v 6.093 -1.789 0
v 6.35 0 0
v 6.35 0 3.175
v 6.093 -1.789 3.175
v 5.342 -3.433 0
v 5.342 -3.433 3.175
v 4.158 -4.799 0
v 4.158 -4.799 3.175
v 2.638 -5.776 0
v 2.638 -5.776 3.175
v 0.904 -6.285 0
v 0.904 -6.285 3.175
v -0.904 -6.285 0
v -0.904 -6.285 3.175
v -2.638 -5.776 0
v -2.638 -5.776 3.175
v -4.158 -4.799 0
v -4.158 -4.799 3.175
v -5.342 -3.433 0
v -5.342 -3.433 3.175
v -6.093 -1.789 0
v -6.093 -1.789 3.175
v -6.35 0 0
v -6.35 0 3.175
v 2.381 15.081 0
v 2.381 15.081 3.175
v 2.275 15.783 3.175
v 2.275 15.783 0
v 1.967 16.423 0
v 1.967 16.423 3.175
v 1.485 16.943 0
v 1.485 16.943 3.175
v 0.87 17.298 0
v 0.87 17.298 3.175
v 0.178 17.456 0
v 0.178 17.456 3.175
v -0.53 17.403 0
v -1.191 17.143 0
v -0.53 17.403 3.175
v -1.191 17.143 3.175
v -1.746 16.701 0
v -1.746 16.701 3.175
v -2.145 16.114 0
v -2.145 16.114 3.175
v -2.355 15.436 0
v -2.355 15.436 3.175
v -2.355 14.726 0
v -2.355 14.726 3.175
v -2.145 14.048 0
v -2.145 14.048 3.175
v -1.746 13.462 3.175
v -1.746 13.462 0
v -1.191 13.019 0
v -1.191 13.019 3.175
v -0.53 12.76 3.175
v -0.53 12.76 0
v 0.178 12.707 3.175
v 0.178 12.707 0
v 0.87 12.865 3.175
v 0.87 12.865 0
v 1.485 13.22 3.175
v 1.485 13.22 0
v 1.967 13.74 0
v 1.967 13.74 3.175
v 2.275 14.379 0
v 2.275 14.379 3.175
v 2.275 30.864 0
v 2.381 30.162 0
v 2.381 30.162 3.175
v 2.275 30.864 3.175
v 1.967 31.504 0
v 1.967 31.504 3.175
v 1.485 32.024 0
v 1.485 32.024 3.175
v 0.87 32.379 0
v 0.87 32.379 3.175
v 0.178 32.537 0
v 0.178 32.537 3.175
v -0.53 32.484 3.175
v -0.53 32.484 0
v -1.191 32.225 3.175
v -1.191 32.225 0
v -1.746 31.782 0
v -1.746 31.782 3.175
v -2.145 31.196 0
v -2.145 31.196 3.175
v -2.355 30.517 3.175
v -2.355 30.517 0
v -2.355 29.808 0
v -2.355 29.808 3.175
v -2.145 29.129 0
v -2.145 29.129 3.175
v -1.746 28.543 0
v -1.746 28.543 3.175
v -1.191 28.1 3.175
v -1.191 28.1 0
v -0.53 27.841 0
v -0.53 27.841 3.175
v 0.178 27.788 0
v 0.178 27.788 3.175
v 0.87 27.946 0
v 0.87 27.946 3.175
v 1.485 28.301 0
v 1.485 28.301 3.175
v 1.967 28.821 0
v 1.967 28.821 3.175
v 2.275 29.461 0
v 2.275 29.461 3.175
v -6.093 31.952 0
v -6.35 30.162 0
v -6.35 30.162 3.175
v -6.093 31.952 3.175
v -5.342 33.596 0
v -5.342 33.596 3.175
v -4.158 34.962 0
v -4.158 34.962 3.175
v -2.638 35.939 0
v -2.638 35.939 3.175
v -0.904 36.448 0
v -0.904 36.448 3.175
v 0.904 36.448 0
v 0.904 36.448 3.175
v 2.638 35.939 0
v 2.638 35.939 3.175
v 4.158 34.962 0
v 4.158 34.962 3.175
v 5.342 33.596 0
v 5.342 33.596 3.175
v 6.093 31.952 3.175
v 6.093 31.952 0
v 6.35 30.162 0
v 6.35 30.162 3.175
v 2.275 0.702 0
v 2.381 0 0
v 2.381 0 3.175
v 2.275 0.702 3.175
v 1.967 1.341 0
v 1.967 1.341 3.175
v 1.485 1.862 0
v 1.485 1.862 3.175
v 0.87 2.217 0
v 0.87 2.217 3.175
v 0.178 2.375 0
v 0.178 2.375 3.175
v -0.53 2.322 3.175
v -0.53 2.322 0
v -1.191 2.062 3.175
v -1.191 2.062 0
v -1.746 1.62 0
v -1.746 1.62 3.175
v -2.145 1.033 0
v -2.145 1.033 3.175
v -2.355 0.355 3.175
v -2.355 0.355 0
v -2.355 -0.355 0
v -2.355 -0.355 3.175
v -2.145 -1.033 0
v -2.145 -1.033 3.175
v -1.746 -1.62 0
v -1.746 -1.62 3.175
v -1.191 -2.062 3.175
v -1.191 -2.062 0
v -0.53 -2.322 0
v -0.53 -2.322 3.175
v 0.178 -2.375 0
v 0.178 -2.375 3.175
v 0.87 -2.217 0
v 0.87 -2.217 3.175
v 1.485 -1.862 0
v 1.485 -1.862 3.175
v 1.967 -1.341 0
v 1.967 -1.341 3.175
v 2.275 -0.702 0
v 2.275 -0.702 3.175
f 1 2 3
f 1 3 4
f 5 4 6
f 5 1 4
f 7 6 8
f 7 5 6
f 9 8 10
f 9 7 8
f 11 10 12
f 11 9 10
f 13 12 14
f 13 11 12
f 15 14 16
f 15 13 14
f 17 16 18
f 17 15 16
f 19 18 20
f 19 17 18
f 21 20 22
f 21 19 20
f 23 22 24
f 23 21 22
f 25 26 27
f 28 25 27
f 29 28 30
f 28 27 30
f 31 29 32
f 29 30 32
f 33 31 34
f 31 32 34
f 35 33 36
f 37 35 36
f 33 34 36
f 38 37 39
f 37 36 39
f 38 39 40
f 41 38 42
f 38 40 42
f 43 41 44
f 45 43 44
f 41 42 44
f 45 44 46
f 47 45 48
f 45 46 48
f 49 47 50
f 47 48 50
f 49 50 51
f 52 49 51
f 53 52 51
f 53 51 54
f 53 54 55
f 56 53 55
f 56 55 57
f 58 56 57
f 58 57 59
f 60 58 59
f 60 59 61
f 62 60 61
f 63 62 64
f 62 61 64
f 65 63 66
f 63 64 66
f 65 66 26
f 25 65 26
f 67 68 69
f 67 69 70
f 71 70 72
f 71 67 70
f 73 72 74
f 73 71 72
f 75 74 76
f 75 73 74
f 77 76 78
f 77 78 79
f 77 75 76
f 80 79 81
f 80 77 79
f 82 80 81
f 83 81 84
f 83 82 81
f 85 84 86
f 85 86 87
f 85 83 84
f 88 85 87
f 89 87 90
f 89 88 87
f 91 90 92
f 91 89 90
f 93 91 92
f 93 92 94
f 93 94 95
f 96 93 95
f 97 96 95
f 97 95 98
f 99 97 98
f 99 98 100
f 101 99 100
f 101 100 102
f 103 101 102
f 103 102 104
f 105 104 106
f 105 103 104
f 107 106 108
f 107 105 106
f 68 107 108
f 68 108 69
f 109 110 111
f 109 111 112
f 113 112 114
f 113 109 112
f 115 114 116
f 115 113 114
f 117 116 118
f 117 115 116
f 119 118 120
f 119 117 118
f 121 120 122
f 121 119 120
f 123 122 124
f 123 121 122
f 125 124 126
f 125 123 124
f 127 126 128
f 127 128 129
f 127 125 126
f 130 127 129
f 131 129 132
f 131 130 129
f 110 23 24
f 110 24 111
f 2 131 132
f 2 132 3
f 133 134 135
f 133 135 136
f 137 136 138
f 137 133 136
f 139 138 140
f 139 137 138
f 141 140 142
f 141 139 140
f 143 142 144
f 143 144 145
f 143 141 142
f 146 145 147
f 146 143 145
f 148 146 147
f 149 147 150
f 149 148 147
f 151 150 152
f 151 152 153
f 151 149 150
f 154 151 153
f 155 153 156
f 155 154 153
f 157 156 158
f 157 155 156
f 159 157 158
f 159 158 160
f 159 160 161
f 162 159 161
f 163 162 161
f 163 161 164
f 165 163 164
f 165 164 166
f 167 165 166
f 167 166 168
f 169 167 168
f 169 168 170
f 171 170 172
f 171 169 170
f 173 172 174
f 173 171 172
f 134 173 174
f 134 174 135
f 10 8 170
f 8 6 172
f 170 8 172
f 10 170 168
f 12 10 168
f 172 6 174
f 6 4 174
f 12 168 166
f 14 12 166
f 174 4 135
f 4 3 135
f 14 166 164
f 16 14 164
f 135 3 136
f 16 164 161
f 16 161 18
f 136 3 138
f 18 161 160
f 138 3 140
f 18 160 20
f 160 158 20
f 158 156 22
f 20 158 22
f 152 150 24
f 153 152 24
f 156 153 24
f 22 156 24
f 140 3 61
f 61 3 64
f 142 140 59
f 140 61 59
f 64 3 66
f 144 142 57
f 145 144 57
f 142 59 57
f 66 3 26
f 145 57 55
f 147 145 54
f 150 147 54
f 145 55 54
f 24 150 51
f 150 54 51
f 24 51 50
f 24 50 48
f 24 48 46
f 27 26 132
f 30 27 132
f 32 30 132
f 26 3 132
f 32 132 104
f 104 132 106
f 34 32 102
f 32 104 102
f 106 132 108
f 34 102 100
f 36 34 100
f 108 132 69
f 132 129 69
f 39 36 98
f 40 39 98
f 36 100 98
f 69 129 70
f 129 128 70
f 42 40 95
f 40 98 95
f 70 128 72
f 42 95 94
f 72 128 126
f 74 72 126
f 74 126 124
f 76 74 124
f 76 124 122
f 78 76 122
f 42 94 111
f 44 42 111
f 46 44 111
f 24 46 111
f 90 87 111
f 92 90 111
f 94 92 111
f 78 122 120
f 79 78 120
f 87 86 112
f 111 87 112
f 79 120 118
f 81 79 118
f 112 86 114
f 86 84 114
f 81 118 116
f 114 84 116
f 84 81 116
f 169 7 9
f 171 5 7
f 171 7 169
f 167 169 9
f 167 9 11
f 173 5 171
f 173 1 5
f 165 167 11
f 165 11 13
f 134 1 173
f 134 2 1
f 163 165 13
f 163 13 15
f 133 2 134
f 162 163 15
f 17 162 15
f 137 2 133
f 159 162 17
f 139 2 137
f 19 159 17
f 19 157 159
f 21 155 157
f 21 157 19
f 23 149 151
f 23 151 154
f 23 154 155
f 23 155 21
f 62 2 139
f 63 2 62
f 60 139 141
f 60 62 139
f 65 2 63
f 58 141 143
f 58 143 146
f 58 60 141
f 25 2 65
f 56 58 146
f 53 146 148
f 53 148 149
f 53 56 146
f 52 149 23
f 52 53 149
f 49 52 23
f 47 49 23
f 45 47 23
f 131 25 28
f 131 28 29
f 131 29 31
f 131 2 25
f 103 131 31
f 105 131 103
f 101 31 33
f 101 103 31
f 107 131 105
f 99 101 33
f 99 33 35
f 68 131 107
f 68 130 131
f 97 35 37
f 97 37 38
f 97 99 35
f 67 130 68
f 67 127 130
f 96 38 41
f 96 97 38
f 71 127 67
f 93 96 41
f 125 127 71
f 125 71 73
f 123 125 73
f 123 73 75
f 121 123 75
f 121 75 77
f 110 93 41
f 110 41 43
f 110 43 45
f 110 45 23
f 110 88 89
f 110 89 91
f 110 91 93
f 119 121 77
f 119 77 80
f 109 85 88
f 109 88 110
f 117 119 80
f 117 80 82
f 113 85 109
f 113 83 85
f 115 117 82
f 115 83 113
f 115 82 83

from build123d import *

# Parameters (mm, degrees)
SKETCH1_R           = 2.38125
BOSS_EXTRUDE1_DEPTH = 3.175
SKETCH2_R           = 2.38125
CUT_EXTRUDE1_DEPTH  = 3.175


with BuildPart() as part:
    # Sketch1 → Boss-Extrude1 (new body)
    with BuildSketch(Plane.XY):
        with BuildLine():
            Line((-6.35, 0), (-6.35, 30.1625))
            ThreePointArc((-6.35, 30.1625), (0, 36.5125), (6.35, 30.1625))
            Line((6.35, 30.1625), (6.35, 0))
            ThreePointArc((6.35, 0), (0, -6.35), (-6.35, 0))
        make_face()
        Circle(SKETCH1_R, mode=Mode.SUBTRACT)
        with Locations((0, 30.1625)):
            Circle(SKETCH1_R, mode=Mode.SUBTRACT)
    extrude(amount=BOSS_EXTRUDE1_DEPTH)

    # Sketch2 → Cut-Extrude1 (cut)
    with BuildSketch(Plane.XY.offset(3.175)):
        with Locations((0, 15.08125)):
            Circle(SKETCH2_R)
    extrude(amount=-CUT_EXTRUDE1_DEPTH, mode=Mode.SUBTRACT)


solid = part.part
